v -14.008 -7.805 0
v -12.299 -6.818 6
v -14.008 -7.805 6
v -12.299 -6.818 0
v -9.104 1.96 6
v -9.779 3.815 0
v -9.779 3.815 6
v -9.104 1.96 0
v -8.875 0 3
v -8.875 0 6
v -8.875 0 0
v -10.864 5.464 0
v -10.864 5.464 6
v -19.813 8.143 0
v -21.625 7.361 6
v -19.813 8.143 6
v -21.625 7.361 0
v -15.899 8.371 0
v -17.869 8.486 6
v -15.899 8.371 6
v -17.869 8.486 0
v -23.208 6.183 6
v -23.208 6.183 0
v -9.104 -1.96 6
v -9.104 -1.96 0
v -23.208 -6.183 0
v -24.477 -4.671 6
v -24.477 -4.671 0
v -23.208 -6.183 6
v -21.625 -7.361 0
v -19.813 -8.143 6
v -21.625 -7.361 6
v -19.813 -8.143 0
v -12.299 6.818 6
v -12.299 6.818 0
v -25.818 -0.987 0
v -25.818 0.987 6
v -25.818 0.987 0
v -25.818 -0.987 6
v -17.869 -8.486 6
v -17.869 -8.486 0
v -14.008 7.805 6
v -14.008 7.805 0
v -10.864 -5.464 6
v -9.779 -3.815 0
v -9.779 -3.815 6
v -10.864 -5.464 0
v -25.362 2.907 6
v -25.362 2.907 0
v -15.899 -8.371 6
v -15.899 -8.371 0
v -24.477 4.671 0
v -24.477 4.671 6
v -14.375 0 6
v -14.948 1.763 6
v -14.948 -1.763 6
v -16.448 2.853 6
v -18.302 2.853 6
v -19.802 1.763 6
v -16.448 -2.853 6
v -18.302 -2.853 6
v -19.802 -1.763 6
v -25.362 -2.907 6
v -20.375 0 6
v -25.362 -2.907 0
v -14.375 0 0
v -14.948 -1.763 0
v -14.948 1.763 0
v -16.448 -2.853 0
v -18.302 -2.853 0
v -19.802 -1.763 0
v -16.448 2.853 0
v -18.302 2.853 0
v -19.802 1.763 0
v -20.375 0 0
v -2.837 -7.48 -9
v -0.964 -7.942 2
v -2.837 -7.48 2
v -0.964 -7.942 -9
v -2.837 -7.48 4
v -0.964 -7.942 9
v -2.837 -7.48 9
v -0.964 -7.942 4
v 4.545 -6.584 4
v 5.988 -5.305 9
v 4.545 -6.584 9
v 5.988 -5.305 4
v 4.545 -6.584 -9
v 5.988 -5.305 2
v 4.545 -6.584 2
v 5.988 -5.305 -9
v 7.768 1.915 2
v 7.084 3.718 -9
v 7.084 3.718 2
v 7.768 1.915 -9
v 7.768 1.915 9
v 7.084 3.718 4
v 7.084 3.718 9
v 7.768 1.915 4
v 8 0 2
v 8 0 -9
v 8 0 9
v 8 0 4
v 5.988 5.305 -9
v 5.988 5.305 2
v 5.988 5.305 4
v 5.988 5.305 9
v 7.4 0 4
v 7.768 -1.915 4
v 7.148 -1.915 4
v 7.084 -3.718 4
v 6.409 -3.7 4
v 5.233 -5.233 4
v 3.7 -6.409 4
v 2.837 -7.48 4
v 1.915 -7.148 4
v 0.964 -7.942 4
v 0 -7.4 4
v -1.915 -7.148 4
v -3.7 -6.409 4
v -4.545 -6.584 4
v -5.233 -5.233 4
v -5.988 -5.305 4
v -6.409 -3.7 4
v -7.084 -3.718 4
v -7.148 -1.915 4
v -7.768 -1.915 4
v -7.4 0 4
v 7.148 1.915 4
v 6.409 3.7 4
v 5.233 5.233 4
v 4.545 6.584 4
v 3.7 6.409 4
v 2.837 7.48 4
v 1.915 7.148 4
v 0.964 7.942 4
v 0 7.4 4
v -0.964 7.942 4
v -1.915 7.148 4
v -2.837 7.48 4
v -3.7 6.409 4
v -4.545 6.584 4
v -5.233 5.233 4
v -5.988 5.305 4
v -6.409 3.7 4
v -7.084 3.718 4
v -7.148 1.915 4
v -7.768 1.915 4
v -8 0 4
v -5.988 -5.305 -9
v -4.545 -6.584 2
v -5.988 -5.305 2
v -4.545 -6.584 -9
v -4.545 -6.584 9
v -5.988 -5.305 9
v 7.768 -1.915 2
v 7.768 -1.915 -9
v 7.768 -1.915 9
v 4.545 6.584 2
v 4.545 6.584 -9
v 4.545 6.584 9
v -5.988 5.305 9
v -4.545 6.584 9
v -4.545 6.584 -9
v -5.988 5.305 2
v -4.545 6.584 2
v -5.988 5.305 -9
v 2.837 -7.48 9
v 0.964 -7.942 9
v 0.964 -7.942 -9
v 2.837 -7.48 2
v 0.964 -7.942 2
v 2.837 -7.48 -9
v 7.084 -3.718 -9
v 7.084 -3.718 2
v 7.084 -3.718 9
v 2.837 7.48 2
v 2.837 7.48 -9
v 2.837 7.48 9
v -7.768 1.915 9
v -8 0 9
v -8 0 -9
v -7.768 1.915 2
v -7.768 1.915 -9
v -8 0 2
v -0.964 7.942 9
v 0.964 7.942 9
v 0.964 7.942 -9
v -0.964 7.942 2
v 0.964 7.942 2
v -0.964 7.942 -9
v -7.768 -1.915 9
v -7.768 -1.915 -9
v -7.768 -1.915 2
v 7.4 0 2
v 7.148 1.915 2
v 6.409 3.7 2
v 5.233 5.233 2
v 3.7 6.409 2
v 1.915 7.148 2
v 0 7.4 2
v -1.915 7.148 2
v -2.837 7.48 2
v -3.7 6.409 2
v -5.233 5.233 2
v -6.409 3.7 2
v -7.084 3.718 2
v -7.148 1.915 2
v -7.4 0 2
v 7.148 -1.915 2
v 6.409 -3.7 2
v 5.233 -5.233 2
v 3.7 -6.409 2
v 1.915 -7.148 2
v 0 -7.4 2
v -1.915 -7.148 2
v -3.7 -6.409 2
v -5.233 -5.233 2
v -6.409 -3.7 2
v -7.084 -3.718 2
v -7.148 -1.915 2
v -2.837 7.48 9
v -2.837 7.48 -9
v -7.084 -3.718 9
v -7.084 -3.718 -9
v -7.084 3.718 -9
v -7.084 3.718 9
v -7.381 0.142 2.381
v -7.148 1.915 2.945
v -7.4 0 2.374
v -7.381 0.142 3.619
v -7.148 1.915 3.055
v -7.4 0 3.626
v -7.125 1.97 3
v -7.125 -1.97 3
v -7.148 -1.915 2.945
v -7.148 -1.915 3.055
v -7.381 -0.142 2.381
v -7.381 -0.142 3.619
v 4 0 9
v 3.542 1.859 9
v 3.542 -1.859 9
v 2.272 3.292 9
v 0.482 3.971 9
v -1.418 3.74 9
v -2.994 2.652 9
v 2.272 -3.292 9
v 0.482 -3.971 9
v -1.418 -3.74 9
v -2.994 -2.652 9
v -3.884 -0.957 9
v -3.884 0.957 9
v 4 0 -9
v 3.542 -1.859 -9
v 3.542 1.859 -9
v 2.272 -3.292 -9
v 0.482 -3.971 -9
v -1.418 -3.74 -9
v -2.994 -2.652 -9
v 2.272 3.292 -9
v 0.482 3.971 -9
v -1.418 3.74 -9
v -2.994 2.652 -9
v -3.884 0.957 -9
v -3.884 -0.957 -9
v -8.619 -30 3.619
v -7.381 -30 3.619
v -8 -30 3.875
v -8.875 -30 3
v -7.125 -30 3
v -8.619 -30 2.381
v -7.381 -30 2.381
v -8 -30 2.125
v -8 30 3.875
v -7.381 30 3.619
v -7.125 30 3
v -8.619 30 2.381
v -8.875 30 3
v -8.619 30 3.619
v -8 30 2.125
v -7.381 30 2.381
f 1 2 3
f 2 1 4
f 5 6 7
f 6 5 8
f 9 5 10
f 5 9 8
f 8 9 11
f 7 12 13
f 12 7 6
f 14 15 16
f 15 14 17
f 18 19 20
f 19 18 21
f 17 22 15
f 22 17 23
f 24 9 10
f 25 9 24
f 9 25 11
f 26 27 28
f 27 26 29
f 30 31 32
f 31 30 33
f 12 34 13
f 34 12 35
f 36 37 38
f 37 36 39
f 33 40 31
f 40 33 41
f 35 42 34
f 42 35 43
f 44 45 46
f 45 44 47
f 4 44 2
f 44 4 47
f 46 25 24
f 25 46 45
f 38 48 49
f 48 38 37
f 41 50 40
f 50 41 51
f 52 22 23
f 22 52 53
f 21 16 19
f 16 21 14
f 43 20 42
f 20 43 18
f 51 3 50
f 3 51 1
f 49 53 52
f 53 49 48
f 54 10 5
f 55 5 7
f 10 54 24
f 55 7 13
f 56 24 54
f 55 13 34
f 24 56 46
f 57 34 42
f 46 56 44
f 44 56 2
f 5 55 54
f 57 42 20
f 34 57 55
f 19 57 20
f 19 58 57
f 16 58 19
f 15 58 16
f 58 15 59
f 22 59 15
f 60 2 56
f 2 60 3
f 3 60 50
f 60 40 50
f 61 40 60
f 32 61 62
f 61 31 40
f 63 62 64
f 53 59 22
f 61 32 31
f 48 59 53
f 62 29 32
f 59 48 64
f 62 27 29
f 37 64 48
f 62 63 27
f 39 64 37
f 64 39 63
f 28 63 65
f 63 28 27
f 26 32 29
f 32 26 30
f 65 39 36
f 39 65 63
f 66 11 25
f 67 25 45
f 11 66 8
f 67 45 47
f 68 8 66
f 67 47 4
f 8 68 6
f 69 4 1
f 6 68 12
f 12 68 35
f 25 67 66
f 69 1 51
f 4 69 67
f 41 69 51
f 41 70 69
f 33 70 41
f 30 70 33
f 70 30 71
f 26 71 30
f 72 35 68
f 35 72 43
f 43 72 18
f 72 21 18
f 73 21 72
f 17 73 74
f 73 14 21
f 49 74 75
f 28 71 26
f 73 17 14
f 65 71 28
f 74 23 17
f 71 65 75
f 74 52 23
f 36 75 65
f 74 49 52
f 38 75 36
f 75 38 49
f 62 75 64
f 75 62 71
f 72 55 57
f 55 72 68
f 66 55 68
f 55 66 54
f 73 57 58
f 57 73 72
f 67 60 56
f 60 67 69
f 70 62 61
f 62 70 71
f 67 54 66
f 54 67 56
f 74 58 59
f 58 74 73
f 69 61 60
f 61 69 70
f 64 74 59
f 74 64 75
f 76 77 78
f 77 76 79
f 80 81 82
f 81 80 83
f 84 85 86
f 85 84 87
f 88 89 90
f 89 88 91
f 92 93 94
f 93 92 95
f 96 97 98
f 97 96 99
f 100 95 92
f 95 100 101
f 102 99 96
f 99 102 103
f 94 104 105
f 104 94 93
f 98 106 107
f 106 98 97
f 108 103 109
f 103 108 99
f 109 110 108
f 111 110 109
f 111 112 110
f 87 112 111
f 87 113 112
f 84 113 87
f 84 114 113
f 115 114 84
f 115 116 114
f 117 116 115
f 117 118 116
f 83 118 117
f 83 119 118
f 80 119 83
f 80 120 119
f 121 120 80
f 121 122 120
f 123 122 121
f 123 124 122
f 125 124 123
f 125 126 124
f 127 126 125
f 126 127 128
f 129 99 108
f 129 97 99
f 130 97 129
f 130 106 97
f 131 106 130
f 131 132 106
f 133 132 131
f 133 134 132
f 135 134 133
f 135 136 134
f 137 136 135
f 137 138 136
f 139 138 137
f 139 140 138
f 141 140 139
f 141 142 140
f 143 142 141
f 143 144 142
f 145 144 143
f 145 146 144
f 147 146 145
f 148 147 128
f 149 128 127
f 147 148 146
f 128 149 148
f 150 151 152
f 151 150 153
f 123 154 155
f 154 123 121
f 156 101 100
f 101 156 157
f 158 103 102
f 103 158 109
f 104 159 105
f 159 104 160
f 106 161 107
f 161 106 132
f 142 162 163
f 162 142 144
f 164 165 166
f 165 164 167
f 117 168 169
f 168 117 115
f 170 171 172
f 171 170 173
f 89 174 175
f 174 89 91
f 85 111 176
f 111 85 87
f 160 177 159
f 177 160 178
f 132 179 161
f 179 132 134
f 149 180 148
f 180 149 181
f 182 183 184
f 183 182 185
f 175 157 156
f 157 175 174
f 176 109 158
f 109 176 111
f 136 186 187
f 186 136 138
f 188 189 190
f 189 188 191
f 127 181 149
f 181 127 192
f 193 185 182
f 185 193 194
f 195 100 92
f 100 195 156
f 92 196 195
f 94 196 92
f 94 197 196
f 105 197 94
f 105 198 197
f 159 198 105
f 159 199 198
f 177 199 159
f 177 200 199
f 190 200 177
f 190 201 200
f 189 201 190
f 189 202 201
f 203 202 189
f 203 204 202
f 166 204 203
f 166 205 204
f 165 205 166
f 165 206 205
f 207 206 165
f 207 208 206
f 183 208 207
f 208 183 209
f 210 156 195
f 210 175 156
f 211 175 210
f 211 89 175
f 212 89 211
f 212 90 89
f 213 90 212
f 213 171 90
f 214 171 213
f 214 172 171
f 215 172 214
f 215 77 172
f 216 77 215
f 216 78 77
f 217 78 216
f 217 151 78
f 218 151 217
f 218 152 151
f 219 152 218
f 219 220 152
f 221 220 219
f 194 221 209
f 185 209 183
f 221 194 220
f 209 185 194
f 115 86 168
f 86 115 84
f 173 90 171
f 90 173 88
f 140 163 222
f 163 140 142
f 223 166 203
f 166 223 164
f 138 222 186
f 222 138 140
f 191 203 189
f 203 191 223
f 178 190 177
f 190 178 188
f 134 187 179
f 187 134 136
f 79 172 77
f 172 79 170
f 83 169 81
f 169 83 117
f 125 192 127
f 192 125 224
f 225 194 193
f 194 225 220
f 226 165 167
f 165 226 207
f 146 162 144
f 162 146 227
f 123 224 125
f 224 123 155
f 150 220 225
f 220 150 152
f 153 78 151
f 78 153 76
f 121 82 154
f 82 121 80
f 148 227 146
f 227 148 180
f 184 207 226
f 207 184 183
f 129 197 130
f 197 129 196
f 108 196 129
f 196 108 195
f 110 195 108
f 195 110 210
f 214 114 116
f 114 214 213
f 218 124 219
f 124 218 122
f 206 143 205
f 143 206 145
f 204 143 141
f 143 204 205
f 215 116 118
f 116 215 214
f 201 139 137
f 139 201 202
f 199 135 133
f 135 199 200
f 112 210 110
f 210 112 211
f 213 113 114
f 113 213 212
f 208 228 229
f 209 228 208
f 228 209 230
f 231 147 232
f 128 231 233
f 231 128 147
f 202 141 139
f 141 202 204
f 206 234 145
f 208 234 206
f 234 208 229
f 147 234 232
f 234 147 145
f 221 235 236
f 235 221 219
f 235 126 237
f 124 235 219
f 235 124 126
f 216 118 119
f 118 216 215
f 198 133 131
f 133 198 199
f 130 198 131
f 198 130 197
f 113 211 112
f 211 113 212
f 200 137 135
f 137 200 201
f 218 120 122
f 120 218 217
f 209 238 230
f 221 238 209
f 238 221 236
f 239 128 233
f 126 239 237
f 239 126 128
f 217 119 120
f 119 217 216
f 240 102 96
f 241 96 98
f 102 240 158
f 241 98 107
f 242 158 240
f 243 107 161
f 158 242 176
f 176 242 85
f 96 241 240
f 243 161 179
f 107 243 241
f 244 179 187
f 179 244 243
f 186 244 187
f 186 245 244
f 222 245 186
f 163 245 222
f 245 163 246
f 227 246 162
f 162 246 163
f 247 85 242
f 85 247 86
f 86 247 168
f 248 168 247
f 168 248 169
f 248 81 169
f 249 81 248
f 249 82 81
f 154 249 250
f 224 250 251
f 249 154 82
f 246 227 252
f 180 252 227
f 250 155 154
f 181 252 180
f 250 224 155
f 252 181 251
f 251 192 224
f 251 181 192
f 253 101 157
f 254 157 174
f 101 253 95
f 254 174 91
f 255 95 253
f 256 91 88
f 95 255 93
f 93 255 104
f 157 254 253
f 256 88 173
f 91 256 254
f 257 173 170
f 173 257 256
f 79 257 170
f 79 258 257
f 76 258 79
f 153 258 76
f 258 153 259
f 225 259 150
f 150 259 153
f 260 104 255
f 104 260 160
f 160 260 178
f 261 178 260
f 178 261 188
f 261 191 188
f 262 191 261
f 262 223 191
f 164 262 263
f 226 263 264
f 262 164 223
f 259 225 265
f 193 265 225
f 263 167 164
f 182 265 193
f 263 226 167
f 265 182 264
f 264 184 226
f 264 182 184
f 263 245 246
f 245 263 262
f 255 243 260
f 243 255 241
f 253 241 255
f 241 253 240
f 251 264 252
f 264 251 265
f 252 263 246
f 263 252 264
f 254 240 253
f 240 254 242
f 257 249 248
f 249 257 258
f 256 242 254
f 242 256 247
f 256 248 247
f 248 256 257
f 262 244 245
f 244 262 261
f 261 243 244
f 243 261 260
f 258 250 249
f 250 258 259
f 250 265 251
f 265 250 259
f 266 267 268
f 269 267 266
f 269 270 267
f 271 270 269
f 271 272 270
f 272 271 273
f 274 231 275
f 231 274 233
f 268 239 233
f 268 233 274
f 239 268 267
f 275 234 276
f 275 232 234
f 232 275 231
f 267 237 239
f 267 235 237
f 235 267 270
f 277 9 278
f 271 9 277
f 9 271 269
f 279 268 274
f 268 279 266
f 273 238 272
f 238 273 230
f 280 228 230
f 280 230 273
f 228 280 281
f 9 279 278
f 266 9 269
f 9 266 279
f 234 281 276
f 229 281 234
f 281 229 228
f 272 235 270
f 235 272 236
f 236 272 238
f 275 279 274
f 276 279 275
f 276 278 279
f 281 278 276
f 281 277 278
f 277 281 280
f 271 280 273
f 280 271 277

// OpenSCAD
//默认使用外径17的轴承
module extruder_wheel(r=16/2)
{
	//轴承
	translate([-r-17/2-1.75/2,0,3])
	difference()
	{
		cylinder(r=17/2,h=6,center=true);
		cylinder(r=3,h=6,center=true);
	}
	
	//挤出齿
	difference()
	{
		cylinder(r=r,h=18,center=true);
		cylinder(r=4,h=18,center=true);
		#translate([0,0,3])difference()
		{
			cylinder(r=r,h=2,center=true);
			cylinder(r=r-0.6,h=2,center=true);
		}
	}
	
	//丝线
	#translate([-r,30,3])
	rotate([90,0,0])
	cylinder(r=1.75/2,h=60,$fn=8);
}

extruder_wheel(8);
